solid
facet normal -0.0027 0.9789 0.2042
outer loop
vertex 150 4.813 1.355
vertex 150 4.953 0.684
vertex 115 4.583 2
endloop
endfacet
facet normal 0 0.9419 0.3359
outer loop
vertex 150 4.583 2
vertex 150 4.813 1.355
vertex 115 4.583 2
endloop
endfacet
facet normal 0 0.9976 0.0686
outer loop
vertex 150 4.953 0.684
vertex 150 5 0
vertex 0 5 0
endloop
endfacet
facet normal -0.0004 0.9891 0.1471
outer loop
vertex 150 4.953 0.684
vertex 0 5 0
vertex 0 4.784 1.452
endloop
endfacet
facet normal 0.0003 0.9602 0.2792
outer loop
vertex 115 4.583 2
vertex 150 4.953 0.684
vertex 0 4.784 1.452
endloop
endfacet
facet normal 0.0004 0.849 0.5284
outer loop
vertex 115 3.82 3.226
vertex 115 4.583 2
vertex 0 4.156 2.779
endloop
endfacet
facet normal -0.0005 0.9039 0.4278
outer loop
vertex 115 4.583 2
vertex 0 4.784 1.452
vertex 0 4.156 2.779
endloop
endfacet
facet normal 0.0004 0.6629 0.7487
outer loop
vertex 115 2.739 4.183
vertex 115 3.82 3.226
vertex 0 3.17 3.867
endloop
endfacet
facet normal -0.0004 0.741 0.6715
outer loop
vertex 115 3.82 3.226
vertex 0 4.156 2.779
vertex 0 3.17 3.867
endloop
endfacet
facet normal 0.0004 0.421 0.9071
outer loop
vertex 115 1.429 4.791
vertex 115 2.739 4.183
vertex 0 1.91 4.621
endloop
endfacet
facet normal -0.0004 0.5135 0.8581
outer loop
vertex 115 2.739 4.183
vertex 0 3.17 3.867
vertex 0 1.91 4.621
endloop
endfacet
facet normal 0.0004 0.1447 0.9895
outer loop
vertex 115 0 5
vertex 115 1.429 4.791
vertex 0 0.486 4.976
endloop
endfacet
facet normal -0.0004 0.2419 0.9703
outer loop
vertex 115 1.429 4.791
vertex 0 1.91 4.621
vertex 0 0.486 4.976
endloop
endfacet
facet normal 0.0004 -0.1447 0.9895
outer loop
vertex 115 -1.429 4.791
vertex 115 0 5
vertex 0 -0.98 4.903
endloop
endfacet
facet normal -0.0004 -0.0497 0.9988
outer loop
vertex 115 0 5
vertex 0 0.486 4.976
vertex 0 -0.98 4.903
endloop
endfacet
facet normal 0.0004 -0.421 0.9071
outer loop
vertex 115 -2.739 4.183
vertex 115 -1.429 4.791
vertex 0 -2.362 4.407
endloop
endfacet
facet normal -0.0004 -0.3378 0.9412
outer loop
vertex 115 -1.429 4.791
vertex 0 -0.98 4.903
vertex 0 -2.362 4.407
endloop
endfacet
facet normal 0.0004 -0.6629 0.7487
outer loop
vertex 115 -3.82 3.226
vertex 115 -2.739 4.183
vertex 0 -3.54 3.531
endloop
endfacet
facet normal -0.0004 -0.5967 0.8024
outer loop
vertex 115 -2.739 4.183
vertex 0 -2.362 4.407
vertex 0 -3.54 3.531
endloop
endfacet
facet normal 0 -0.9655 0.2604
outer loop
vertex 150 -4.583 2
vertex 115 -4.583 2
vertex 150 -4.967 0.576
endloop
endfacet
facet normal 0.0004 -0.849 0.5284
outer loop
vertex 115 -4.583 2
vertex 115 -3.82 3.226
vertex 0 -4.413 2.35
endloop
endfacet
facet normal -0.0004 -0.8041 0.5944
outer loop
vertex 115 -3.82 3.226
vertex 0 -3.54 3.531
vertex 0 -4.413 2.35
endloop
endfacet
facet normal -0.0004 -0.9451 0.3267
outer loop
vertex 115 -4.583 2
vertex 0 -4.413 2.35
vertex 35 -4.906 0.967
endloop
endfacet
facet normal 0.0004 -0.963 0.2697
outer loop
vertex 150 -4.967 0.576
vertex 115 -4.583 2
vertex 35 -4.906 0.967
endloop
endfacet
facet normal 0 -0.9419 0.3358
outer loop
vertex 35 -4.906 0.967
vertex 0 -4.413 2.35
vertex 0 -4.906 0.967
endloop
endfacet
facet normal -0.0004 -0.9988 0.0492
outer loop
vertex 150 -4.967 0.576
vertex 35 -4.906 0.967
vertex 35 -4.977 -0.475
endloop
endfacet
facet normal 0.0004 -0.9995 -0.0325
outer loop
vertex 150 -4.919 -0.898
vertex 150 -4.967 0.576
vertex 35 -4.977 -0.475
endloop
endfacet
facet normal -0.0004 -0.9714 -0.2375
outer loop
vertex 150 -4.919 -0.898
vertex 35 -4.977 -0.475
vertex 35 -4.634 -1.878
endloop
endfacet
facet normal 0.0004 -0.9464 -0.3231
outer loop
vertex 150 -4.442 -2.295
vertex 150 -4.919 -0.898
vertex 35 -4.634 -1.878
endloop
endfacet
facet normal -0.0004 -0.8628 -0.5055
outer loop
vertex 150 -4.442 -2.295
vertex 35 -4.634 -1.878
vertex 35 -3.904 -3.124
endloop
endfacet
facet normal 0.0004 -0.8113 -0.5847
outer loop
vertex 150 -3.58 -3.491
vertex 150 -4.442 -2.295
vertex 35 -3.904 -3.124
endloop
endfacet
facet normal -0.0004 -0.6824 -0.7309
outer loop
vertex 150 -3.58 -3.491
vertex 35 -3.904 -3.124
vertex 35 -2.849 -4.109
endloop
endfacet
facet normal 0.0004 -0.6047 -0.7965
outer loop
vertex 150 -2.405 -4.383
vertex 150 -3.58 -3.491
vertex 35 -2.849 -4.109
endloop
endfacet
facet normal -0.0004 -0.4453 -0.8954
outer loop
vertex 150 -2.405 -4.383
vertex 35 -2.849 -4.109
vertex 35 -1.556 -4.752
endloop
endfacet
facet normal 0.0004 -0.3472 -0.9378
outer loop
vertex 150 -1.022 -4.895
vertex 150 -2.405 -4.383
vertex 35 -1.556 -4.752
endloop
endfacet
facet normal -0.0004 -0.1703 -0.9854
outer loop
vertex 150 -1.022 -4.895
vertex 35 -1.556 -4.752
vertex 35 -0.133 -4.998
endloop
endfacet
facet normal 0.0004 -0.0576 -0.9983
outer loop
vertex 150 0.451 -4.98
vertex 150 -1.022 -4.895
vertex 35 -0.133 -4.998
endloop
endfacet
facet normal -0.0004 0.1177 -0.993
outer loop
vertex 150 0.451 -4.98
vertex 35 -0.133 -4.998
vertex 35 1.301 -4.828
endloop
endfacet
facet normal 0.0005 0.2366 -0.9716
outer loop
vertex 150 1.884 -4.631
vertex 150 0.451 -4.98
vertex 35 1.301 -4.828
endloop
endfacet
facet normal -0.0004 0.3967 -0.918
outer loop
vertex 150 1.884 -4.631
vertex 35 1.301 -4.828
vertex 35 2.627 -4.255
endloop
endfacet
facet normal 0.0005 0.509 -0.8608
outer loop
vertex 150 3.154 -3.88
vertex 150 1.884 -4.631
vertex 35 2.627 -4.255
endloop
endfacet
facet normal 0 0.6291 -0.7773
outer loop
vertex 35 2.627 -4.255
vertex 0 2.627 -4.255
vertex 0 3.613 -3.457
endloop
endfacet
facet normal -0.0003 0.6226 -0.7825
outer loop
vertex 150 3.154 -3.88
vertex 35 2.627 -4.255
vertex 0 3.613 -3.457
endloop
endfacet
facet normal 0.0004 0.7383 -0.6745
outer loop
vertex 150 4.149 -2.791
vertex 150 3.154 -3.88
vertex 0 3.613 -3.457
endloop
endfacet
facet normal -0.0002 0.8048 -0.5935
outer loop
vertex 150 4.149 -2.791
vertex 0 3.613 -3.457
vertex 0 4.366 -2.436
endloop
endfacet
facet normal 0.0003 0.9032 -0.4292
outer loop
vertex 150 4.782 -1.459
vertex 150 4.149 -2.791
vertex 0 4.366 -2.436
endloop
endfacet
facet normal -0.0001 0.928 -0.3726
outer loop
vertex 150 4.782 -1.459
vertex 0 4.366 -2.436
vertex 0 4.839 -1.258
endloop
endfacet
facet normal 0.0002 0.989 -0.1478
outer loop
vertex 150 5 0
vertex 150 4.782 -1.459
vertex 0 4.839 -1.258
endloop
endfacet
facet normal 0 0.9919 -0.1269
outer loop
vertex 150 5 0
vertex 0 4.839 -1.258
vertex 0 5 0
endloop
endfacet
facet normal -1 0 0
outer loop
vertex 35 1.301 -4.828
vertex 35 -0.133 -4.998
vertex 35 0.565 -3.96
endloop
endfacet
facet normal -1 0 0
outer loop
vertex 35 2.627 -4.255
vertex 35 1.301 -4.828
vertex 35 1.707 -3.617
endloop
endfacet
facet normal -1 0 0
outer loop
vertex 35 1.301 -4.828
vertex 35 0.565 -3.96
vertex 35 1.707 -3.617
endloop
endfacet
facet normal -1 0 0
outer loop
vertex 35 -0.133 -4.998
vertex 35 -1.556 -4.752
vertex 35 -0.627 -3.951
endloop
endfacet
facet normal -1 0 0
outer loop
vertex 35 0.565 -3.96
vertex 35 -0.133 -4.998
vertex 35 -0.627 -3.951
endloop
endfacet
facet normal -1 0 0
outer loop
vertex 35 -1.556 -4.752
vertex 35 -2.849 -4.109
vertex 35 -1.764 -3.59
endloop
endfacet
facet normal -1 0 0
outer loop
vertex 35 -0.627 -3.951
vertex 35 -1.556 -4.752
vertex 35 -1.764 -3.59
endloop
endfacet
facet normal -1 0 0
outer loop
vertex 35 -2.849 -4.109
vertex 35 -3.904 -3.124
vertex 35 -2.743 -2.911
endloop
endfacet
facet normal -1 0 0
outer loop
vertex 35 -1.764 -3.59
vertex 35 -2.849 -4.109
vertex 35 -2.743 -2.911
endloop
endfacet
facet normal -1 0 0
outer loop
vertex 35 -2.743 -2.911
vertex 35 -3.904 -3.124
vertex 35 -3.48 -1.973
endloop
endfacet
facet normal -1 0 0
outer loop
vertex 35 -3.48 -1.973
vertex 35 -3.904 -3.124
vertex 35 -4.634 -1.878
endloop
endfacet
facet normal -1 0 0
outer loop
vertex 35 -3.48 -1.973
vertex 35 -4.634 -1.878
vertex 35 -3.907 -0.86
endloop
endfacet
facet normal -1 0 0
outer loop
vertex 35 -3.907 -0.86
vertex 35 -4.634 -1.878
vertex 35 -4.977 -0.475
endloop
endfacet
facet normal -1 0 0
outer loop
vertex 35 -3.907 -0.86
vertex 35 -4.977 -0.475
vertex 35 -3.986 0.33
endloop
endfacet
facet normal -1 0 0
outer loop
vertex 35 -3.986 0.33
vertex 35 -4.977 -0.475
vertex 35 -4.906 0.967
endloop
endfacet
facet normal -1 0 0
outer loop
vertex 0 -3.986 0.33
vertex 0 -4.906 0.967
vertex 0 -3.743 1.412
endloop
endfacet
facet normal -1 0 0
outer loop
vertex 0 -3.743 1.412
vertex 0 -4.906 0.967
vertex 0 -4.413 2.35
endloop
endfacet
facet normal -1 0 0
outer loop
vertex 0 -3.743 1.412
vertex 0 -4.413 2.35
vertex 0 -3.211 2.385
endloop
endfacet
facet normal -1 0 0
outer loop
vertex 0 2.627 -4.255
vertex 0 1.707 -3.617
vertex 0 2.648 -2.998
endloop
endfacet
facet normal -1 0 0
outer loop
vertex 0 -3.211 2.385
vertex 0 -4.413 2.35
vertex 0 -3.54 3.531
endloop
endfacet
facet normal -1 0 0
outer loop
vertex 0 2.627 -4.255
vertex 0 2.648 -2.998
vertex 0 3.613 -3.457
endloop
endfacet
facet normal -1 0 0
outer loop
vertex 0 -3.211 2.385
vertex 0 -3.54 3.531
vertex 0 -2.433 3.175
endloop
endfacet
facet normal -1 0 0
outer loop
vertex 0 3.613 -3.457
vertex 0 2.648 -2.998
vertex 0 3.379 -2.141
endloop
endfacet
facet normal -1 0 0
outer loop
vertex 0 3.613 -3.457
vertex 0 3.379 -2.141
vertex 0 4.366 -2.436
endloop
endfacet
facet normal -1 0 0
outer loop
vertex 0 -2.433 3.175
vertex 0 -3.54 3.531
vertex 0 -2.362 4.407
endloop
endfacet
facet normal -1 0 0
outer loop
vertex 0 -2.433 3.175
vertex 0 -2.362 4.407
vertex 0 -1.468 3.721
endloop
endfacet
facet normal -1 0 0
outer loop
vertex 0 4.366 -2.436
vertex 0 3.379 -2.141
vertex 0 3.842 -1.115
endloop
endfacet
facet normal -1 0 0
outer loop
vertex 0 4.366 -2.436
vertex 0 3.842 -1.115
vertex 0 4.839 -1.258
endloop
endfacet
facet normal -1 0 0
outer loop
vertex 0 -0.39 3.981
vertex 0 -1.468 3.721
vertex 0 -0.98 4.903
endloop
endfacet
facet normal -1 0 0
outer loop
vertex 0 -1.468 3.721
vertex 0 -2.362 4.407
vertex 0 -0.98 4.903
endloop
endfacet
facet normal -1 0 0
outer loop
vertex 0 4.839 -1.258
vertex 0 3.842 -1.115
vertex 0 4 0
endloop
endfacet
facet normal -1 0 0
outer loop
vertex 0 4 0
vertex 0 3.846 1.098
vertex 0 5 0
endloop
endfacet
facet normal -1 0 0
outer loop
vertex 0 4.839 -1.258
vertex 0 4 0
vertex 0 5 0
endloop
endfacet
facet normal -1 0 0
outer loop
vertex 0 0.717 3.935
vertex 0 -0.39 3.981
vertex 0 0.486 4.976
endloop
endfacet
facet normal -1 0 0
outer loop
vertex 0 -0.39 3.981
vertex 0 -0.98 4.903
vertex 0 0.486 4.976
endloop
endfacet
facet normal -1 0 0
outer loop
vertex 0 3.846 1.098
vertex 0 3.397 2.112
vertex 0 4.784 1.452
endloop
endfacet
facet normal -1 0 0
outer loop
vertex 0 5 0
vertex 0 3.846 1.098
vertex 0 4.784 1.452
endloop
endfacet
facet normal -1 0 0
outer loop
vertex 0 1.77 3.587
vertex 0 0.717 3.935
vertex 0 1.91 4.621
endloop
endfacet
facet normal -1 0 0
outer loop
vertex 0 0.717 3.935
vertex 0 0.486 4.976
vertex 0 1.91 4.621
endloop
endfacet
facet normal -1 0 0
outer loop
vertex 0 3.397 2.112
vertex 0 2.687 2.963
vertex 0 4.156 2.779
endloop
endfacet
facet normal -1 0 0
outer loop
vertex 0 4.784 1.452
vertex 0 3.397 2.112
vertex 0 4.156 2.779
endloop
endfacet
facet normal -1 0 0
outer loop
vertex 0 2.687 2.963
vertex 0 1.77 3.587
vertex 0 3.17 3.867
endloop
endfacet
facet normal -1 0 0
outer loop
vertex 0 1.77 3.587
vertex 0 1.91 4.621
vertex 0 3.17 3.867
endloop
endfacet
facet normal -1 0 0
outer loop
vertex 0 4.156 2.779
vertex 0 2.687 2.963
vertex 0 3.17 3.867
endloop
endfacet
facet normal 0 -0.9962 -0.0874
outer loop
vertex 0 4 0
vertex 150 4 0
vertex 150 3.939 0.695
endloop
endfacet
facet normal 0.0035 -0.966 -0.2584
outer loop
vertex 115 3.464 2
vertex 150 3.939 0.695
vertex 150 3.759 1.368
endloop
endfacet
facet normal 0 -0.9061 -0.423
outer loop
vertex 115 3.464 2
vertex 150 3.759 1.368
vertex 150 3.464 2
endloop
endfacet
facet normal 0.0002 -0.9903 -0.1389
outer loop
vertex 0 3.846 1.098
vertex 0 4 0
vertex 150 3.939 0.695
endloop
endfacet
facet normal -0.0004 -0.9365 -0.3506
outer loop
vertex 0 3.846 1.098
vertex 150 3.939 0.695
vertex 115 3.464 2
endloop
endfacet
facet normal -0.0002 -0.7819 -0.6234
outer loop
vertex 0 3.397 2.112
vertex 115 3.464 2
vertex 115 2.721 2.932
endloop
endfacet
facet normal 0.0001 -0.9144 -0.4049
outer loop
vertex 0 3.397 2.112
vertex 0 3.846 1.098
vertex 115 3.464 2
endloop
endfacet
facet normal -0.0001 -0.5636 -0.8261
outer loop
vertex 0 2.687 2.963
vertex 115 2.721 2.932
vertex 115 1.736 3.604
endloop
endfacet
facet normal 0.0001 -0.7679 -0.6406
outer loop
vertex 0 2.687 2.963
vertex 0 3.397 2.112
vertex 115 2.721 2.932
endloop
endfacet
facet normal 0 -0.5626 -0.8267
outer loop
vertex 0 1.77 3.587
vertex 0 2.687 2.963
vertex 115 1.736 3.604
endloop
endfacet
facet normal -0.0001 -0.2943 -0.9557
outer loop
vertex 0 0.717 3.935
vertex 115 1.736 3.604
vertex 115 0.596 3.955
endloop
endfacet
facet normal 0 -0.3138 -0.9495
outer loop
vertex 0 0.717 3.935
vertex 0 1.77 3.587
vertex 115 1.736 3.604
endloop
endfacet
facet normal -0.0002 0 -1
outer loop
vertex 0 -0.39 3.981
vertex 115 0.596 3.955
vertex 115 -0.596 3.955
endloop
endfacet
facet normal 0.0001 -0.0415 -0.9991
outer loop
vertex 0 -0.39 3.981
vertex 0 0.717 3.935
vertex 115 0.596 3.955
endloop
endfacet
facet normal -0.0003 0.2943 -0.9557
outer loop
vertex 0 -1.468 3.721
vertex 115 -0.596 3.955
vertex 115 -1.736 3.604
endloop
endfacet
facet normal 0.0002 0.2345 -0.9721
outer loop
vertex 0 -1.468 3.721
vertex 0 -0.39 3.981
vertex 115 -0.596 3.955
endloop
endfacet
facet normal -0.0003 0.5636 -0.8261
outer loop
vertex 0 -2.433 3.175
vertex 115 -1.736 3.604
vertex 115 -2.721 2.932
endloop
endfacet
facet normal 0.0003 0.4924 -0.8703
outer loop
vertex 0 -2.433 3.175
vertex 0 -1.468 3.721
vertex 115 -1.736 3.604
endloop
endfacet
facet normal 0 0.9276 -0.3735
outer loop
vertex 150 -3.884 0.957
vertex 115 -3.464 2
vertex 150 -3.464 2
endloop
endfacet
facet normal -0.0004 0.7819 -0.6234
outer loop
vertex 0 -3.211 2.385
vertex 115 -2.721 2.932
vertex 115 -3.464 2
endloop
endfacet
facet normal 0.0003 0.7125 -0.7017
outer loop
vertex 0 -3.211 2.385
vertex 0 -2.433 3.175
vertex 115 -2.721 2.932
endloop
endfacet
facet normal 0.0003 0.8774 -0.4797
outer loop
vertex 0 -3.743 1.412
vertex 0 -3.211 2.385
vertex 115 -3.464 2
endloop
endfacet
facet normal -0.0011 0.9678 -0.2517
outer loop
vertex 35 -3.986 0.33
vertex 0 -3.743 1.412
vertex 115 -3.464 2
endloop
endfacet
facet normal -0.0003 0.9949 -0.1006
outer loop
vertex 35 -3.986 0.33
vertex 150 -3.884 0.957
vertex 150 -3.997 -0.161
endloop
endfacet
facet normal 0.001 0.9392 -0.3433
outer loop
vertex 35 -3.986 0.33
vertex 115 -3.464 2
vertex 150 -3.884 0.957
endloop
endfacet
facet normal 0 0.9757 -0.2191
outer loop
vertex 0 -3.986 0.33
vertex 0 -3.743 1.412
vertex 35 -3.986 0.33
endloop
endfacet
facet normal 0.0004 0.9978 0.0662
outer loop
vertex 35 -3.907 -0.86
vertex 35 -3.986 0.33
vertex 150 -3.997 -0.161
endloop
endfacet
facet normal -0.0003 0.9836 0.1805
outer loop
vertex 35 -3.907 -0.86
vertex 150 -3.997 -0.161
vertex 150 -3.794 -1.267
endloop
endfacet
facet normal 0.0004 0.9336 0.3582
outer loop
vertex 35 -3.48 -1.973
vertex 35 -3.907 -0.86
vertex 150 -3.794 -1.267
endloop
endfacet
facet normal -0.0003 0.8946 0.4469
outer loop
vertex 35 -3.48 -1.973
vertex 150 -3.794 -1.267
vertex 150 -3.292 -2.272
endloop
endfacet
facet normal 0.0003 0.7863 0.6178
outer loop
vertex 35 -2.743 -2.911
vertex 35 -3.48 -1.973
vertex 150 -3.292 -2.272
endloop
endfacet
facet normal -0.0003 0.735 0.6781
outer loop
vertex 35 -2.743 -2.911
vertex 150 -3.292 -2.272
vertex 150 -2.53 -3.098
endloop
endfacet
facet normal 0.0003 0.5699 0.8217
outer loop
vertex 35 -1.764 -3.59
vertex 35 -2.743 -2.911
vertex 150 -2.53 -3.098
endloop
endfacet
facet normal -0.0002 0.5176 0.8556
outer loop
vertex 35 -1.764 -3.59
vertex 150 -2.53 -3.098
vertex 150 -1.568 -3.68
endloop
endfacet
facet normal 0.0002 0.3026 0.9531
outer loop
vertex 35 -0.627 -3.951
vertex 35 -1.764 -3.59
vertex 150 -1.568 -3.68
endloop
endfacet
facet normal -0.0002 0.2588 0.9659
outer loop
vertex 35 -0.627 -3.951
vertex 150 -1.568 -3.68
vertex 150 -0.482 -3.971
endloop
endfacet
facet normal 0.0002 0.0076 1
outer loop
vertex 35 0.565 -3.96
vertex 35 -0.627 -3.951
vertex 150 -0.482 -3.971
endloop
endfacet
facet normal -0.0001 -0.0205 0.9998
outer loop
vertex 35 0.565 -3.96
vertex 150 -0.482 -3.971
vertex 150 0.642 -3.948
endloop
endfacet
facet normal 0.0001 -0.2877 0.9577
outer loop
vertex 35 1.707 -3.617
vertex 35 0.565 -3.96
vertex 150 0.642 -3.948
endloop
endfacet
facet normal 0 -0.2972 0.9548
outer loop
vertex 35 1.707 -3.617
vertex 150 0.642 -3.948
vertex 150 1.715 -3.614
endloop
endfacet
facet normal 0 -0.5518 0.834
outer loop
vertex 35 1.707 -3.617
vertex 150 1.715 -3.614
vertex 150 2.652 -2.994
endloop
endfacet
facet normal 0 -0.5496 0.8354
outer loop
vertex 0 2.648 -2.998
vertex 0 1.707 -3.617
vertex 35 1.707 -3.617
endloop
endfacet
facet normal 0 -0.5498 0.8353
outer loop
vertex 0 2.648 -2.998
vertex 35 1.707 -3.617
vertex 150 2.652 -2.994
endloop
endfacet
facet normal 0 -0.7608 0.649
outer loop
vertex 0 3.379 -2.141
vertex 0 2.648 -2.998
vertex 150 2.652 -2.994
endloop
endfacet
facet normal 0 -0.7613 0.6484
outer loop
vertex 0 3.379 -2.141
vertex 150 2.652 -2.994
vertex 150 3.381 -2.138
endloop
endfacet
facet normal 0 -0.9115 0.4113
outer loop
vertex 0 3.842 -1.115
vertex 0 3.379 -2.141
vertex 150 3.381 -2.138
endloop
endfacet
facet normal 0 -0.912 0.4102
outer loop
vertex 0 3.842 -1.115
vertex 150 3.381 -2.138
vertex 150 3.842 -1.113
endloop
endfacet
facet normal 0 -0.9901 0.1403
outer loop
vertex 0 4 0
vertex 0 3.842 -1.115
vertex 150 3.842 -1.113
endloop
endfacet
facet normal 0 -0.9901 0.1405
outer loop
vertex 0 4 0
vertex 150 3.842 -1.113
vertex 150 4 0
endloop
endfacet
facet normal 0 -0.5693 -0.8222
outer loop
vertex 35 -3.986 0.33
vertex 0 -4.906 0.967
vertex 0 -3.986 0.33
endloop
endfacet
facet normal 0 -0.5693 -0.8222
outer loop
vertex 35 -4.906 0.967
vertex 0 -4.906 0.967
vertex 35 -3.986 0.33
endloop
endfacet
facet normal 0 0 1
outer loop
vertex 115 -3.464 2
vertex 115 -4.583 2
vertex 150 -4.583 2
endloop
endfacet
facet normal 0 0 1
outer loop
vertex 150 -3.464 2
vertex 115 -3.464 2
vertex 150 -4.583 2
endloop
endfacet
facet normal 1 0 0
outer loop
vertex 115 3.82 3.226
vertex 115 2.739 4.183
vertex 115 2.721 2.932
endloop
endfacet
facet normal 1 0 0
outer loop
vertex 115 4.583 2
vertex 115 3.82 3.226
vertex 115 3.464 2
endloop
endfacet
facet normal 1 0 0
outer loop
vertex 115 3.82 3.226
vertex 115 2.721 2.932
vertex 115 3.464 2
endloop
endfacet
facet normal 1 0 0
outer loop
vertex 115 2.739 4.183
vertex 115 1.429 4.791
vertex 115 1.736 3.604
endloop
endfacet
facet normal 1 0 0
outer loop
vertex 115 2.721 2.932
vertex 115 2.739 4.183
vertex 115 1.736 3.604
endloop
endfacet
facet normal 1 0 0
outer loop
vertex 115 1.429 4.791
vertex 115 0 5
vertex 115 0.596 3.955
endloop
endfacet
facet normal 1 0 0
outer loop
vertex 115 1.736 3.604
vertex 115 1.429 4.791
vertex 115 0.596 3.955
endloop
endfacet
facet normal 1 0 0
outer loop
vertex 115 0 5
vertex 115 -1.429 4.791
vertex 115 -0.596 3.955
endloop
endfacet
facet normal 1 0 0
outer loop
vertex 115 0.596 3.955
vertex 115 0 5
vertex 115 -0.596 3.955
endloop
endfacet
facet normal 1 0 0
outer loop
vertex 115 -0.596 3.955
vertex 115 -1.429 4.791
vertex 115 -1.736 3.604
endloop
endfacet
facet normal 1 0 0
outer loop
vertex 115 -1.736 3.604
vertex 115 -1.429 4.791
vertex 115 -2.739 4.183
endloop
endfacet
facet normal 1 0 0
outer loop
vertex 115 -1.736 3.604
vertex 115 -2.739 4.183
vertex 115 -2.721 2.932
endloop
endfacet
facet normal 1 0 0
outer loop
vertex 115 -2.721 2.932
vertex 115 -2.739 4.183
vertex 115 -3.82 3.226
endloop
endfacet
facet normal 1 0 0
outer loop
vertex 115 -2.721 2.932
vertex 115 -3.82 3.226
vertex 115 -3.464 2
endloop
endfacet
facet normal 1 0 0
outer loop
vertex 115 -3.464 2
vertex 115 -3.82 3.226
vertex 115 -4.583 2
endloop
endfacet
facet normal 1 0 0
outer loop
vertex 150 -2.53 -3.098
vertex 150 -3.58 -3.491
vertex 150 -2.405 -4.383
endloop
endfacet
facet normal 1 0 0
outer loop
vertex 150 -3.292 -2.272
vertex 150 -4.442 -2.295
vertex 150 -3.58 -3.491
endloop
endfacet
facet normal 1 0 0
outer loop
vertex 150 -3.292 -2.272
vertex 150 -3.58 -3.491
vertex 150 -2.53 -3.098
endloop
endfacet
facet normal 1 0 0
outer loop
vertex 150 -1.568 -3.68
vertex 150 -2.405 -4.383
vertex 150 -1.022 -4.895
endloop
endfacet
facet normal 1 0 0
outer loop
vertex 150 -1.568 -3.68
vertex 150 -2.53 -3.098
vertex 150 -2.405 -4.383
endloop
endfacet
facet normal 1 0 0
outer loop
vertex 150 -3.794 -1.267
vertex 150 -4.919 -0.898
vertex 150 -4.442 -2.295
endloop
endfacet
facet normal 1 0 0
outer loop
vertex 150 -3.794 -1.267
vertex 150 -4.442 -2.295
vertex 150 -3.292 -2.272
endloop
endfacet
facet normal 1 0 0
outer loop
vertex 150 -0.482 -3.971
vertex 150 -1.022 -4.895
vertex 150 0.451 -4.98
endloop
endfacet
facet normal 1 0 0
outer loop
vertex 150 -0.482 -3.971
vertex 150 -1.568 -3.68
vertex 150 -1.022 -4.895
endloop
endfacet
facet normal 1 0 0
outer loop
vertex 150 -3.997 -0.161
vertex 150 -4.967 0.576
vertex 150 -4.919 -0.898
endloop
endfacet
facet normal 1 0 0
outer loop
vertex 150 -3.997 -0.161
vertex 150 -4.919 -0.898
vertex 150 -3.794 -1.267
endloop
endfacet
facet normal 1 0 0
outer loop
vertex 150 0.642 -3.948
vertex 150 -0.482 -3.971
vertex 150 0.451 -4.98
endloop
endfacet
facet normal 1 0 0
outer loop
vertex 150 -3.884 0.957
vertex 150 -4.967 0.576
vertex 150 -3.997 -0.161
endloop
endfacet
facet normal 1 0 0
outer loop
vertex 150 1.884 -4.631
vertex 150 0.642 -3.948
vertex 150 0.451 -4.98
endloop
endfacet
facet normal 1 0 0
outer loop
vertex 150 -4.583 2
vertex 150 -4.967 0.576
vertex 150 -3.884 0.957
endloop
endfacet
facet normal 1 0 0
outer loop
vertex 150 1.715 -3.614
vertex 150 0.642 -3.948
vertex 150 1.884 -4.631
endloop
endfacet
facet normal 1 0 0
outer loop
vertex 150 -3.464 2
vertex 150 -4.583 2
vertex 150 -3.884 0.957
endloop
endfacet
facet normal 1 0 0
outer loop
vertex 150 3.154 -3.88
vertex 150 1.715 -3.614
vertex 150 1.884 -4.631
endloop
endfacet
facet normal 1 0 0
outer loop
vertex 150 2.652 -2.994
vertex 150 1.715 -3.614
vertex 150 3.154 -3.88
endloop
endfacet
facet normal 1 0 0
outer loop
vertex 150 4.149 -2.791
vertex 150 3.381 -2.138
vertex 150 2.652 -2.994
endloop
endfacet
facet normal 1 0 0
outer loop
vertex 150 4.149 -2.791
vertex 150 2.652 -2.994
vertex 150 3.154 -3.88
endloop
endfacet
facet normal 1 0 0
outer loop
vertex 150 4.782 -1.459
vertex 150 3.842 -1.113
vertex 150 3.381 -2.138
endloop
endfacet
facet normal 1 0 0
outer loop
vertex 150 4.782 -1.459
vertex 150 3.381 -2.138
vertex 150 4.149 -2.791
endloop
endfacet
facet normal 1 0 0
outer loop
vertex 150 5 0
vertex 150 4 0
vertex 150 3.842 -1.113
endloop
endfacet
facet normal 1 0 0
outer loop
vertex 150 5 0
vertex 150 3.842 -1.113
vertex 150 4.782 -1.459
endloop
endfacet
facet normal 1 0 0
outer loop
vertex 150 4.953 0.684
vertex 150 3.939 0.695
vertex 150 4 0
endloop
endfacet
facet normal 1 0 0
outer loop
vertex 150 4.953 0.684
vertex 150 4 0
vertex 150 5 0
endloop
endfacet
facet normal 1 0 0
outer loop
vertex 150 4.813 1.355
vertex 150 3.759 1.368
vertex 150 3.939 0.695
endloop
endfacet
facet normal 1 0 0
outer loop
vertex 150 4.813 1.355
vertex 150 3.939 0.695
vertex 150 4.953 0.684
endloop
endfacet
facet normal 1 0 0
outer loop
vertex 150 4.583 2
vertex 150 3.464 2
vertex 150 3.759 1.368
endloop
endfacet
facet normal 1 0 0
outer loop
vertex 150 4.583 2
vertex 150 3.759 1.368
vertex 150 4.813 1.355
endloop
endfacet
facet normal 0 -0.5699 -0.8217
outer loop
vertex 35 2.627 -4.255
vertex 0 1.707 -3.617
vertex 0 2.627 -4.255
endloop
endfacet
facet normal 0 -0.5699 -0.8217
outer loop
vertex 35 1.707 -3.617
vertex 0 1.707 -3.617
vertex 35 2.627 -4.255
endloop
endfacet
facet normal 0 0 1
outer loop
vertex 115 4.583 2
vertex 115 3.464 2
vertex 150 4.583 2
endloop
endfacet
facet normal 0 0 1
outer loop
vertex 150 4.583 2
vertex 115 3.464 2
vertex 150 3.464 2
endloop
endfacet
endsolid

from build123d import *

# Parameters (mm, degrees)
F0_R     = 5
F0_R_2   = 4
F1_DEPTH = 150
F3_DEPTH = 5
F5_W     = 35
F5_H     = 10
F6_DEPTH = 12.5


with BuildPart() as f1:
    # F0 (on Right) → F1 (new body)
    with BuildSketch(Plane.YZ):
        Circle(F0_R)
        Circle(F0_R_2, mode=Mode.SUBTRACT)
    extrude(amount=F1_DEPTH)

    # F2 (on Front) → F3 (cut, symmetric)
    with BuildSketch(Plane.XZ):
        Polygon((115, 2), (150, 2), (150, 5), (150, 12), (115, 12), align=None)
    extrude(amount=F3_DEPTH, both=True, mode=Mode.SUBTRACT)

    # F5 (on face) → F6 (cut, symmetric)
    with BuildSketch(Plane(origin=(0, 0, 0), x_dir=(1, 0, 0), z_dir=(0, -0.821816, 0.569753))):
        with Locations((17.5, -7)):
            Rectangle(F5_W, F5_H)
    extrude(amount=F6_DEPTH, both=True, mode=Mode.SUBTRACT)


solid = f1.part
